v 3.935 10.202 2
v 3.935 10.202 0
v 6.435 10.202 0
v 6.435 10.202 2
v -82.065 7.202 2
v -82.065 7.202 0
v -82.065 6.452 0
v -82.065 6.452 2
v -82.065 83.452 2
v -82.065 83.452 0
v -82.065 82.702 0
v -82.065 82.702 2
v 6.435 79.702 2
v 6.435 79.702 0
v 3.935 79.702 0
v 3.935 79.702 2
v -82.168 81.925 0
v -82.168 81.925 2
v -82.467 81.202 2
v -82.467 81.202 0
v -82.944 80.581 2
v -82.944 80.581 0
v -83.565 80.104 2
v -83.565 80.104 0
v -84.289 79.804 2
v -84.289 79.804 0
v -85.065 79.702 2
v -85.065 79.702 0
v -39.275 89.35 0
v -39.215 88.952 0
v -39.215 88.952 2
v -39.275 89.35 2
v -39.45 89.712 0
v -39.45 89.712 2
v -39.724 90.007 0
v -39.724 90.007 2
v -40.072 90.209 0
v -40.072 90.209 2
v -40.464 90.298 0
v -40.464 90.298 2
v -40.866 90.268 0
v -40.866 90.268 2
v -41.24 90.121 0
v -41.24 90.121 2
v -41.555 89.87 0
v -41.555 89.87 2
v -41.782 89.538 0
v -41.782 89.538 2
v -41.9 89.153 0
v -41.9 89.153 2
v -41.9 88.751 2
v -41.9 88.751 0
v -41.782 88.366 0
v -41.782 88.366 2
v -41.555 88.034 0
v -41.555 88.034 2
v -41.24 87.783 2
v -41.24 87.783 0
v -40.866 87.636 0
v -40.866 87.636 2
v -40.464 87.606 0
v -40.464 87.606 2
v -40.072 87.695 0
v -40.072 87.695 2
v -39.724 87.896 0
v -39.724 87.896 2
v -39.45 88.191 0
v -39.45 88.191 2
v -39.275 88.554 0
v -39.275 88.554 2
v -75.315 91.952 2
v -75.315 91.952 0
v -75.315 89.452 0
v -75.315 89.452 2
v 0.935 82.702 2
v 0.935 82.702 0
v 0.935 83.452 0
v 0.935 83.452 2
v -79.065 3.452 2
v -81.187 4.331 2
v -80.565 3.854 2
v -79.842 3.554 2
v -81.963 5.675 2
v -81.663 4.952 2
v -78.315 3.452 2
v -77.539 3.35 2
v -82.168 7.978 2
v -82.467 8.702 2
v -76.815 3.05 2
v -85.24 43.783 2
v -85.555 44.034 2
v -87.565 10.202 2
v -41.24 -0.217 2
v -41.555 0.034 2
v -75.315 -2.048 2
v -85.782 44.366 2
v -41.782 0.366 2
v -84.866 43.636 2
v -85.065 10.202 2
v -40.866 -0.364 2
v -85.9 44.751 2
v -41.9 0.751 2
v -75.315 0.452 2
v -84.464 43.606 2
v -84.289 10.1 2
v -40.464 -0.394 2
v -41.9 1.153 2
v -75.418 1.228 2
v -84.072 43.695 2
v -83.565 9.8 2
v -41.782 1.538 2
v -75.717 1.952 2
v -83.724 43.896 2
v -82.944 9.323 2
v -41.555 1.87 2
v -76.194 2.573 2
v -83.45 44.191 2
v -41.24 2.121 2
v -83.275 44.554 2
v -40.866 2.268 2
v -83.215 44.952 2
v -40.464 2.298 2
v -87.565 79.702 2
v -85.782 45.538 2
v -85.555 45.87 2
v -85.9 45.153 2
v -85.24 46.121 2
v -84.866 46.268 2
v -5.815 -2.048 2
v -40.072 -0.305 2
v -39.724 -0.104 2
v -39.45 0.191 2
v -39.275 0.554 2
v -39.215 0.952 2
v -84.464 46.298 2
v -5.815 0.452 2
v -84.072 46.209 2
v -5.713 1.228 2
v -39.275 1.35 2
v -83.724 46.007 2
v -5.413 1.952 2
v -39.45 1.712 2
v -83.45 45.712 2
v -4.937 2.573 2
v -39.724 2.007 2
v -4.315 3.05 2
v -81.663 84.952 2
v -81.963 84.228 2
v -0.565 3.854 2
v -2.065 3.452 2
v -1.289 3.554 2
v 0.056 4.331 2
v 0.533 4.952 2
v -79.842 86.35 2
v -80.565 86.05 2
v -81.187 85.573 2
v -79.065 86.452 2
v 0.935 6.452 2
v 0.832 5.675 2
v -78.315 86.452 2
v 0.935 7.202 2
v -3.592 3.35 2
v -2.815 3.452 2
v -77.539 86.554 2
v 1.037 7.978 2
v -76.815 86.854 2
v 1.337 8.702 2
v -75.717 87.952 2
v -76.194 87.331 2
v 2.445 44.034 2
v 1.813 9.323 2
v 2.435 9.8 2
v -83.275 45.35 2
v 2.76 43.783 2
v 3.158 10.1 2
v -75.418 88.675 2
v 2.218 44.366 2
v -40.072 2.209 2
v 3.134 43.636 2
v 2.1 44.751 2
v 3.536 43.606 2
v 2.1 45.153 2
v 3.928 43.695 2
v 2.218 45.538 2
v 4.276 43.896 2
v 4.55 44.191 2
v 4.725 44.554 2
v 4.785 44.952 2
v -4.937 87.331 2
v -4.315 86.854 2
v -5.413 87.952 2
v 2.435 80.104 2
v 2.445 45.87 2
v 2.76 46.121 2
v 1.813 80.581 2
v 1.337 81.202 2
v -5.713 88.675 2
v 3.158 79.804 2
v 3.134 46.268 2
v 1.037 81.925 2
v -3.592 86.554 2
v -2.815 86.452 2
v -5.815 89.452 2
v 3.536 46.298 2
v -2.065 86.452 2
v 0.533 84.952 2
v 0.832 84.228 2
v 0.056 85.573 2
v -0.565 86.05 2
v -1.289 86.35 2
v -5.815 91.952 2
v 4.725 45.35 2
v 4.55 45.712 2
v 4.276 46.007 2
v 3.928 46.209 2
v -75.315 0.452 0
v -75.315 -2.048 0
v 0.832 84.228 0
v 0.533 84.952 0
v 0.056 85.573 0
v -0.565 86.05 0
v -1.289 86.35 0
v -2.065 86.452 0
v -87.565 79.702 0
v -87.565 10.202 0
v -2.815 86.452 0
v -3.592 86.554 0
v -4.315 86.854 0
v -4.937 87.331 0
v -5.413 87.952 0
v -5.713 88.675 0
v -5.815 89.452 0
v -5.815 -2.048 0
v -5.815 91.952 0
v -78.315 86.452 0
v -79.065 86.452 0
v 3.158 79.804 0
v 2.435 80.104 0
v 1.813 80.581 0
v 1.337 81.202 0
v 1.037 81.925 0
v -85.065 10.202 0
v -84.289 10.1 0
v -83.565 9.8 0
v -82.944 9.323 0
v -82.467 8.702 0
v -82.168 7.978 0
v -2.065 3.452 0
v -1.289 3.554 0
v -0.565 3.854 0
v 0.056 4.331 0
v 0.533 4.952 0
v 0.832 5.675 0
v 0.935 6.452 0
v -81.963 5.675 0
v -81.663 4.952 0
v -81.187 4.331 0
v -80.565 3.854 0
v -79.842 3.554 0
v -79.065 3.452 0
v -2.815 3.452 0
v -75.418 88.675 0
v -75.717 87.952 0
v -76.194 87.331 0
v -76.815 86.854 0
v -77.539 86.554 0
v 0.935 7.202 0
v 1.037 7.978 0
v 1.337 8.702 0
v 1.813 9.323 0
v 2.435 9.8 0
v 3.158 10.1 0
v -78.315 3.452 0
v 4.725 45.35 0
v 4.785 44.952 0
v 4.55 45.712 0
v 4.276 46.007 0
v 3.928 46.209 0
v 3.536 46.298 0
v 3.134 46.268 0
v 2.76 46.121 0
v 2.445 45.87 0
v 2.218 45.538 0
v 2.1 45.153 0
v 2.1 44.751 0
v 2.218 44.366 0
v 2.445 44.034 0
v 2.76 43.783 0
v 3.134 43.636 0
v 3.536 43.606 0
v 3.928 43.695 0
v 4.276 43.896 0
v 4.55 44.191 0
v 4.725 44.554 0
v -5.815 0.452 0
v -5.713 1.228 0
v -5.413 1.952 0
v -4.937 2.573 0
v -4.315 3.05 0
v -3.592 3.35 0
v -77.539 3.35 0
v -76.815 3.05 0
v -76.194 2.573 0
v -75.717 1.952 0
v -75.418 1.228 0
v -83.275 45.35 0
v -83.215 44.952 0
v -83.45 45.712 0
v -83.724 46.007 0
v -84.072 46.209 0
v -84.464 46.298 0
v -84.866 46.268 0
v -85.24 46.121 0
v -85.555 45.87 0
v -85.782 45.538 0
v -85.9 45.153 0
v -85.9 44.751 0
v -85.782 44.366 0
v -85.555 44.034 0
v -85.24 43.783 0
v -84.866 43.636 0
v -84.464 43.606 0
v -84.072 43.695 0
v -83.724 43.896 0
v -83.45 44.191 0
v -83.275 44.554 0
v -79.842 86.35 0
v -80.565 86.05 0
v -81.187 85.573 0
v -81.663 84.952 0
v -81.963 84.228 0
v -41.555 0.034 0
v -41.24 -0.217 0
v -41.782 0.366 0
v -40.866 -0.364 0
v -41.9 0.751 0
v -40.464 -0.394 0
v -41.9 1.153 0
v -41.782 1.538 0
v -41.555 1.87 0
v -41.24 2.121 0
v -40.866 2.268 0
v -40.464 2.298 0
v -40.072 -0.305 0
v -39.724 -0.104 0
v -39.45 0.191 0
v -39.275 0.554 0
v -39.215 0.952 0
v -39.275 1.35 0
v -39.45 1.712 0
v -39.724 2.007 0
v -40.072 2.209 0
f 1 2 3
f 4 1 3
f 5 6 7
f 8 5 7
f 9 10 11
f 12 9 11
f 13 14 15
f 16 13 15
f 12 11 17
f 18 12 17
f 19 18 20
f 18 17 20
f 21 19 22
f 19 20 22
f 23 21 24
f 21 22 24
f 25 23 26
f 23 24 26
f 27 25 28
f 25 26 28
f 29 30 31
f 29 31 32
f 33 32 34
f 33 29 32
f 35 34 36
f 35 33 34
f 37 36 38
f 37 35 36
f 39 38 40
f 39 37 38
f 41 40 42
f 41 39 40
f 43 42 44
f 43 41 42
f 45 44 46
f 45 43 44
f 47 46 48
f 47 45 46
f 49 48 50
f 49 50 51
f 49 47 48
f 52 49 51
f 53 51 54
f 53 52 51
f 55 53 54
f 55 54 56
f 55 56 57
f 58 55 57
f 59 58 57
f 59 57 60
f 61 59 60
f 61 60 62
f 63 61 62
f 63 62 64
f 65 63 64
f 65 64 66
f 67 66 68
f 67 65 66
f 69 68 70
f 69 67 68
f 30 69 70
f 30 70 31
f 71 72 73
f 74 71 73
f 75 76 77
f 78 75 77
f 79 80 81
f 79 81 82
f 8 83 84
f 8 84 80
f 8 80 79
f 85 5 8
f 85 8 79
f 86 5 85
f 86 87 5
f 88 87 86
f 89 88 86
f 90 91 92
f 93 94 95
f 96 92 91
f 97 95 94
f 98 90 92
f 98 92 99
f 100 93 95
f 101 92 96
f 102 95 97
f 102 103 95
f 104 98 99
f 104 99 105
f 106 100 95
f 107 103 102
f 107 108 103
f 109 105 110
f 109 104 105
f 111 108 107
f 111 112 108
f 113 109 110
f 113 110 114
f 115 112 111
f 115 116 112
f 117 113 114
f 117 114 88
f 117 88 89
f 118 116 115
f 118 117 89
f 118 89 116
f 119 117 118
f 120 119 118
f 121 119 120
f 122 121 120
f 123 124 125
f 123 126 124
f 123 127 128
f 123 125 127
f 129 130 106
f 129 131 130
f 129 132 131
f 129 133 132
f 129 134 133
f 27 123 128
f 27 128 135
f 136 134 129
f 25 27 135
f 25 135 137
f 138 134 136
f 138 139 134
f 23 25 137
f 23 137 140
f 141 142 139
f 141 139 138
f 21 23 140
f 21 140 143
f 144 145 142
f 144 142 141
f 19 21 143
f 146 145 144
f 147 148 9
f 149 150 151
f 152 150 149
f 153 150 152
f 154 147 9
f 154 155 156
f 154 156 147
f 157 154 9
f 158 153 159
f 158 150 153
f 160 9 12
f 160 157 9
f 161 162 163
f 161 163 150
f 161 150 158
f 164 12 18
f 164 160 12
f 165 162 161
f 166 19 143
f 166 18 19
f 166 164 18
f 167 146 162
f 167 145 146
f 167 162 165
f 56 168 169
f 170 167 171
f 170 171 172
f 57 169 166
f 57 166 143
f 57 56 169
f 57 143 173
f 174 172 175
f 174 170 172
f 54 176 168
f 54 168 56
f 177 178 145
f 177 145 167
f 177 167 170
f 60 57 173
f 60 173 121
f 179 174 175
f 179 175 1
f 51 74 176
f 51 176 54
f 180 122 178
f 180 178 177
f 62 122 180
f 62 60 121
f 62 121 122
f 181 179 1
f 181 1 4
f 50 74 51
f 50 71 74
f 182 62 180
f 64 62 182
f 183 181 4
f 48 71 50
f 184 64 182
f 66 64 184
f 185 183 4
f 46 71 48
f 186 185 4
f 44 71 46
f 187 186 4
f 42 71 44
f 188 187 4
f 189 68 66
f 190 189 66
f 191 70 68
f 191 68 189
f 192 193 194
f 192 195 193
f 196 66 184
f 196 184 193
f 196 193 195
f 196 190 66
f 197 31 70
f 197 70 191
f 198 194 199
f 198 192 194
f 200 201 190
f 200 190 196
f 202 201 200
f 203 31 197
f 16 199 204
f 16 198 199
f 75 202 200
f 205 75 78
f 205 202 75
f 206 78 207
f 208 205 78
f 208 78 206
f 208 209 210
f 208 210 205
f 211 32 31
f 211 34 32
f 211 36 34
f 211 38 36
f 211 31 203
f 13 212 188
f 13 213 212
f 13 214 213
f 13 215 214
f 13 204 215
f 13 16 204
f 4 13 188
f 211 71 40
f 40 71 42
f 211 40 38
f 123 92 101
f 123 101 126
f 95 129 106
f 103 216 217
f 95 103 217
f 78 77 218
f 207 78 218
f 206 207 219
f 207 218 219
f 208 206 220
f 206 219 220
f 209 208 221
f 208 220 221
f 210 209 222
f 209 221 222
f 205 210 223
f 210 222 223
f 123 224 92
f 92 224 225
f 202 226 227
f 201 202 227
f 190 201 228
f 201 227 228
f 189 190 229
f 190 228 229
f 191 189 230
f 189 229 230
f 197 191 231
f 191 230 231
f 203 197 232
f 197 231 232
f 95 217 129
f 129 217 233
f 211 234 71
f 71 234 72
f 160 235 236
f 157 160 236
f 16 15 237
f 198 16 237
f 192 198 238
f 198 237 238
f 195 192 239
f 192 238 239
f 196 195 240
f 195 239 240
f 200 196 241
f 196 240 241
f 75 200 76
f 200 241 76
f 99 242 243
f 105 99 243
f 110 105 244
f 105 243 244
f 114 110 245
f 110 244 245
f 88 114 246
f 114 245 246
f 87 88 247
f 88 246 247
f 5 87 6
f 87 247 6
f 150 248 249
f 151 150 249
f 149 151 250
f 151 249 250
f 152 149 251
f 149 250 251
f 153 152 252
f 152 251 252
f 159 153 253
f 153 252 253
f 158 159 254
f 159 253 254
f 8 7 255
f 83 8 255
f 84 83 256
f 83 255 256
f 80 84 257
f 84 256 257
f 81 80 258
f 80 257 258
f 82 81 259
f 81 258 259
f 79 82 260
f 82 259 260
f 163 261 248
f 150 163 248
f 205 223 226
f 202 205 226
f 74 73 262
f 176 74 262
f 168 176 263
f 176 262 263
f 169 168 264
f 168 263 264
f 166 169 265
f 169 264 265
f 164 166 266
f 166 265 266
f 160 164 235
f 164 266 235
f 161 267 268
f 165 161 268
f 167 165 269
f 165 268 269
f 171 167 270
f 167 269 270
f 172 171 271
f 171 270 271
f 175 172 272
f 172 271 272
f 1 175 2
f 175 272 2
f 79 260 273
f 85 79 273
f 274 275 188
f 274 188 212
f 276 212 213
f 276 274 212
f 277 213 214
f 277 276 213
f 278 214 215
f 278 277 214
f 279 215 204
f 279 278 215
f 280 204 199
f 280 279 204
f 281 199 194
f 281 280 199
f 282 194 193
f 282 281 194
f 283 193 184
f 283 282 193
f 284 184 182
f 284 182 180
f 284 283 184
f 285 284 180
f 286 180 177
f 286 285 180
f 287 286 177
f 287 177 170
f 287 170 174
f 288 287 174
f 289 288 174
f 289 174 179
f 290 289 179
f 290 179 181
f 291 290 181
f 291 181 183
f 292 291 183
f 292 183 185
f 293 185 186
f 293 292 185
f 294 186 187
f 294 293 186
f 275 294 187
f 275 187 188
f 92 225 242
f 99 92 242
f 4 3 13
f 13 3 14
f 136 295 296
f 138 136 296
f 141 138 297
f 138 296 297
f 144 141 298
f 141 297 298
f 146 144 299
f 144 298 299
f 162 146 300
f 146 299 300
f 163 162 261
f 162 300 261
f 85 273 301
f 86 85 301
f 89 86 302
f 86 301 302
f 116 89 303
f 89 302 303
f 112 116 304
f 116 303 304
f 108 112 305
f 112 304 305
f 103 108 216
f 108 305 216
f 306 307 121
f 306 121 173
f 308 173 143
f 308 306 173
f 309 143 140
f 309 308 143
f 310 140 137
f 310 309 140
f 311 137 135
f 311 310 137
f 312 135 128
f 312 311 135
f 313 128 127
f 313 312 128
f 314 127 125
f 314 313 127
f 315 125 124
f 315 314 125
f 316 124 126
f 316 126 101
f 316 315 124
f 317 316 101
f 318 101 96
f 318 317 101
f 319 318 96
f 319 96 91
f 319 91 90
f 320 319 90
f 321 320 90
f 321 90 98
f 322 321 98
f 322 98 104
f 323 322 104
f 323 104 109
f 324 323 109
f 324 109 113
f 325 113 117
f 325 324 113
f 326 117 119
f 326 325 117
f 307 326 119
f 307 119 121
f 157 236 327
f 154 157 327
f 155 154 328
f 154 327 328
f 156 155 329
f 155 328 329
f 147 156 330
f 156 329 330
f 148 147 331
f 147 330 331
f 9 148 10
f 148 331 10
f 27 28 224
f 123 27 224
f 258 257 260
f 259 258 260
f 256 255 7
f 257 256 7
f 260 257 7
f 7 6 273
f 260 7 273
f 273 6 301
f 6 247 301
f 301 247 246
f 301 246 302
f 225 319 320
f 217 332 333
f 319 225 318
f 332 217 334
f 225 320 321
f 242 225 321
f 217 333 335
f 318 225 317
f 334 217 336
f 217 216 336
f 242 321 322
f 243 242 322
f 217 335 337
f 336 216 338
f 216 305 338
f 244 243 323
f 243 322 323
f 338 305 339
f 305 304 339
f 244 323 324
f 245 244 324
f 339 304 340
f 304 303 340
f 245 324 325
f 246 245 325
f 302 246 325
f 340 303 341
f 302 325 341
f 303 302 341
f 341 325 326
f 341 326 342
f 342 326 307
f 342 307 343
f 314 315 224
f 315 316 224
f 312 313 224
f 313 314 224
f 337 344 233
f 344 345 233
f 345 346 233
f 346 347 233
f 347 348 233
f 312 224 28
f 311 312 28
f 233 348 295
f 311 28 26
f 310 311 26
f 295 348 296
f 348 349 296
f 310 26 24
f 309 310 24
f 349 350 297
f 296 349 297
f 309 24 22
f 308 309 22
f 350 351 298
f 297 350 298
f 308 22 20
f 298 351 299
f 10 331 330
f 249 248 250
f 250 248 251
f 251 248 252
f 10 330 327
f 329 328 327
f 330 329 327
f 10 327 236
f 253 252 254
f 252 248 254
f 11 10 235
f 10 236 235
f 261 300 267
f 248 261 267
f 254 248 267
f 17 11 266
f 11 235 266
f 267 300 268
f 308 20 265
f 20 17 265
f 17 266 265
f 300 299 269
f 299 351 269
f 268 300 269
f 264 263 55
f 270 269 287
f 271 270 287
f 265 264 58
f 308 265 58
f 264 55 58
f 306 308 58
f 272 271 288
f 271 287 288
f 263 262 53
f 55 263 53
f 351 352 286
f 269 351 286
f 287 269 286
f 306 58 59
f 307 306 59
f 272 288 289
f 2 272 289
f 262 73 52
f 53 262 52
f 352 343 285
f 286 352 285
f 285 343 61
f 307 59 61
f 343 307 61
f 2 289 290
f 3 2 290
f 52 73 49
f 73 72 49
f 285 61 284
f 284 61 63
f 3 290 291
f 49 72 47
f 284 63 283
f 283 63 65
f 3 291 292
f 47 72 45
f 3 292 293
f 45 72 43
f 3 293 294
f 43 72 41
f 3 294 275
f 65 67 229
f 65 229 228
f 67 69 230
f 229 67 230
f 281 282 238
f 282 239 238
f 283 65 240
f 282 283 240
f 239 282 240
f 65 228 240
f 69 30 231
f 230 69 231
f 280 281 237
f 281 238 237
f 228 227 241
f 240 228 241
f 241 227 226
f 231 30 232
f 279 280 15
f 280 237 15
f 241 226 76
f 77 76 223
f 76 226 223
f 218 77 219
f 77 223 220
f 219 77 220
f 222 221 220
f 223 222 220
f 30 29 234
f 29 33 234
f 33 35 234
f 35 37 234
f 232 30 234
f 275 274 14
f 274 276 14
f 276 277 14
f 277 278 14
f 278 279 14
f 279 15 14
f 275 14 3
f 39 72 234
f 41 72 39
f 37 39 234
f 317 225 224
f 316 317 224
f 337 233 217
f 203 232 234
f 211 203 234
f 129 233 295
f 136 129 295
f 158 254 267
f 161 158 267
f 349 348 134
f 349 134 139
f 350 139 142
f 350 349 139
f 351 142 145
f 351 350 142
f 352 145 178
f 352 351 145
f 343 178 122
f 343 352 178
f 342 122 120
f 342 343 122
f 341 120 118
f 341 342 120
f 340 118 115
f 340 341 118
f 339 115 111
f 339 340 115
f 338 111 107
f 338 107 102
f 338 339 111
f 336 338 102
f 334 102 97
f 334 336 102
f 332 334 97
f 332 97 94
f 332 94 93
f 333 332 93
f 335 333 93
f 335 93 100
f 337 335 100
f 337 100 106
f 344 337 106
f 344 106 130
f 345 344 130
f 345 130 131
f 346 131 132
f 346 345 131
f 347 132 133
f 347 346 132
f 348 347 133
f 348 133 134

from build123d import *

# Parameters (mm, degrees)
SKETCH2_R           = 1.35
BOSS_EXTRUDE1_DEPTH = 2


with BuildPart() as part:
    # Sketch2 → Boss-Extrude1 (new body)
    with BuildSketch(Plane.XY):
        with BuildLine():
            Line((-5.815342674, -2.04814307), (-5.815342674, 0.45185693))
            ThreePointArc((-5.815342674, 0.45185693), (-4.936663017, 2.573177274), (-2.815342674, 3.45185693))
            Line((-2.815342674, 3.45185693), (-2.065342674, 3.45185693))
            ThreePointArc((-2.065342674, 3.45185693), (0.05597767, 4.330536587), (0.934657326, 6.45185693))
            Line((0.934657326, 6.45185693), (0.934657326, 7.20185693))
            ThreePointArc((0.934657326, 7.20185693), (1.813336983, 9.323177274), (3.934657326, 10.20185693))
            Line((3.934657326, 10.20185693), (6.434657326, 10.20185693))
            Line((6.434657326, 10.20185693), (6.43465612, 79.70185693))
            Line((6.43465612, 79.70185693), (3.93465612, 79.70185693))
            ThreePointArc((3.93465612, 79.70185693), (1.813335776, 80.580536587), (0.93465612, 82.70185693))
            Line((0.93465612, 82.70185693), (0.93465612, 83.45185693))
            ThreePointArc((0.93465612, 83.45185693), (0.055976464, 85.573177274), (-2.06534388, 86.45185693))
            Line((-2.06534388, 86.45185693), (-2.81534388, 86.45185693))
            ThreePointArc((-2.81534388, 86.45185693), (-4.936664224, 87.330536587), (-5.81534388, 89.45185693))
            Line((-5.81534388, 89.45185693), (-5.81534388, 91.95185693))
            Line((-5.81534388, 91.95185693), (-75.31534388, 91.95185693))
            Line((-75.31534388, 91.95185693), (-75.31534388, 89.45185693))
            ThreePointArc((-75.31534388, 89.45185693), (-76.194023536, 87.330536587), (-78.31534388, 86.45185693))
            Line((-78.31534388, 86.45185693), (-79.06534388, 86.45185693))
            ThreePointArc((-79.06534388, 86.45185693), (-81.186664224, 85.573177274), (-82.06534388, 83.45185693))
            Line((-82.06534388, 83.45185693), (-82.06534388, 82.70185693))
            ThreePointArc((-82.06534388, 82.70185693), (-82.944023536, 80.580536587), (-85.06534388, 79.70185693))
            Line((-85.06534388, 79.70185693), (-87.56534388, 79.70185693))
            Line((-87.56534388, 79.70185693), (-87.565342674, 10.20185693))
            Line((-87.565342674, 10.20185693), (-85.065342674, 10.20185693))
            ThreePointArc((-85.065342674, 10.20185693), (-82.94402233, 9.323177274), (-82.065342674, 7.20185693))
            Line((-82.065342674, 7.20185693), (-82.065342674, 6.45185693))
            ThreePointArc((-82.065342674, 6.45185693), (-81.186663017, 4.330536587), (-79.065342674, 3.45185693))
            Line((-79.065342674, 3.45185693), (-78.315342674, 3.45185693))
            ThreePointArc((-78.315342674, 3.45185693), (-76.19402233, 2.573177274), (-75.315342674, 0.45185693))
            Line((-75.315342674, 0.45185693), (-75.315342674, -2.04814307))
            Line((-75.315342674, -2.04814307), (-5.815342674, -2.04814307))
        make_face()
        with Locations((-40.56534404, 88.95185693)):
            Circle(SKETCH2_R, mode=Mode.SUBTRACT)
        with Locations((-84.565343277, 44.95185693)):
            Circle(SKETCH2_R, mode=Mode.SUBTRACT)
        with Locations((3.434656723, 44.95185693)):
            Circle(SKETCH2_R, mode=Mode.SUBTRACT)
        with Locations((-40.565342513, 0.95185693)):
            Circle(SKETCH2_R, mode=Mode.SUBTRACT)
    extrude(amount=BOSS_EXTRUDE1_DEPTH)


solid = part.part
